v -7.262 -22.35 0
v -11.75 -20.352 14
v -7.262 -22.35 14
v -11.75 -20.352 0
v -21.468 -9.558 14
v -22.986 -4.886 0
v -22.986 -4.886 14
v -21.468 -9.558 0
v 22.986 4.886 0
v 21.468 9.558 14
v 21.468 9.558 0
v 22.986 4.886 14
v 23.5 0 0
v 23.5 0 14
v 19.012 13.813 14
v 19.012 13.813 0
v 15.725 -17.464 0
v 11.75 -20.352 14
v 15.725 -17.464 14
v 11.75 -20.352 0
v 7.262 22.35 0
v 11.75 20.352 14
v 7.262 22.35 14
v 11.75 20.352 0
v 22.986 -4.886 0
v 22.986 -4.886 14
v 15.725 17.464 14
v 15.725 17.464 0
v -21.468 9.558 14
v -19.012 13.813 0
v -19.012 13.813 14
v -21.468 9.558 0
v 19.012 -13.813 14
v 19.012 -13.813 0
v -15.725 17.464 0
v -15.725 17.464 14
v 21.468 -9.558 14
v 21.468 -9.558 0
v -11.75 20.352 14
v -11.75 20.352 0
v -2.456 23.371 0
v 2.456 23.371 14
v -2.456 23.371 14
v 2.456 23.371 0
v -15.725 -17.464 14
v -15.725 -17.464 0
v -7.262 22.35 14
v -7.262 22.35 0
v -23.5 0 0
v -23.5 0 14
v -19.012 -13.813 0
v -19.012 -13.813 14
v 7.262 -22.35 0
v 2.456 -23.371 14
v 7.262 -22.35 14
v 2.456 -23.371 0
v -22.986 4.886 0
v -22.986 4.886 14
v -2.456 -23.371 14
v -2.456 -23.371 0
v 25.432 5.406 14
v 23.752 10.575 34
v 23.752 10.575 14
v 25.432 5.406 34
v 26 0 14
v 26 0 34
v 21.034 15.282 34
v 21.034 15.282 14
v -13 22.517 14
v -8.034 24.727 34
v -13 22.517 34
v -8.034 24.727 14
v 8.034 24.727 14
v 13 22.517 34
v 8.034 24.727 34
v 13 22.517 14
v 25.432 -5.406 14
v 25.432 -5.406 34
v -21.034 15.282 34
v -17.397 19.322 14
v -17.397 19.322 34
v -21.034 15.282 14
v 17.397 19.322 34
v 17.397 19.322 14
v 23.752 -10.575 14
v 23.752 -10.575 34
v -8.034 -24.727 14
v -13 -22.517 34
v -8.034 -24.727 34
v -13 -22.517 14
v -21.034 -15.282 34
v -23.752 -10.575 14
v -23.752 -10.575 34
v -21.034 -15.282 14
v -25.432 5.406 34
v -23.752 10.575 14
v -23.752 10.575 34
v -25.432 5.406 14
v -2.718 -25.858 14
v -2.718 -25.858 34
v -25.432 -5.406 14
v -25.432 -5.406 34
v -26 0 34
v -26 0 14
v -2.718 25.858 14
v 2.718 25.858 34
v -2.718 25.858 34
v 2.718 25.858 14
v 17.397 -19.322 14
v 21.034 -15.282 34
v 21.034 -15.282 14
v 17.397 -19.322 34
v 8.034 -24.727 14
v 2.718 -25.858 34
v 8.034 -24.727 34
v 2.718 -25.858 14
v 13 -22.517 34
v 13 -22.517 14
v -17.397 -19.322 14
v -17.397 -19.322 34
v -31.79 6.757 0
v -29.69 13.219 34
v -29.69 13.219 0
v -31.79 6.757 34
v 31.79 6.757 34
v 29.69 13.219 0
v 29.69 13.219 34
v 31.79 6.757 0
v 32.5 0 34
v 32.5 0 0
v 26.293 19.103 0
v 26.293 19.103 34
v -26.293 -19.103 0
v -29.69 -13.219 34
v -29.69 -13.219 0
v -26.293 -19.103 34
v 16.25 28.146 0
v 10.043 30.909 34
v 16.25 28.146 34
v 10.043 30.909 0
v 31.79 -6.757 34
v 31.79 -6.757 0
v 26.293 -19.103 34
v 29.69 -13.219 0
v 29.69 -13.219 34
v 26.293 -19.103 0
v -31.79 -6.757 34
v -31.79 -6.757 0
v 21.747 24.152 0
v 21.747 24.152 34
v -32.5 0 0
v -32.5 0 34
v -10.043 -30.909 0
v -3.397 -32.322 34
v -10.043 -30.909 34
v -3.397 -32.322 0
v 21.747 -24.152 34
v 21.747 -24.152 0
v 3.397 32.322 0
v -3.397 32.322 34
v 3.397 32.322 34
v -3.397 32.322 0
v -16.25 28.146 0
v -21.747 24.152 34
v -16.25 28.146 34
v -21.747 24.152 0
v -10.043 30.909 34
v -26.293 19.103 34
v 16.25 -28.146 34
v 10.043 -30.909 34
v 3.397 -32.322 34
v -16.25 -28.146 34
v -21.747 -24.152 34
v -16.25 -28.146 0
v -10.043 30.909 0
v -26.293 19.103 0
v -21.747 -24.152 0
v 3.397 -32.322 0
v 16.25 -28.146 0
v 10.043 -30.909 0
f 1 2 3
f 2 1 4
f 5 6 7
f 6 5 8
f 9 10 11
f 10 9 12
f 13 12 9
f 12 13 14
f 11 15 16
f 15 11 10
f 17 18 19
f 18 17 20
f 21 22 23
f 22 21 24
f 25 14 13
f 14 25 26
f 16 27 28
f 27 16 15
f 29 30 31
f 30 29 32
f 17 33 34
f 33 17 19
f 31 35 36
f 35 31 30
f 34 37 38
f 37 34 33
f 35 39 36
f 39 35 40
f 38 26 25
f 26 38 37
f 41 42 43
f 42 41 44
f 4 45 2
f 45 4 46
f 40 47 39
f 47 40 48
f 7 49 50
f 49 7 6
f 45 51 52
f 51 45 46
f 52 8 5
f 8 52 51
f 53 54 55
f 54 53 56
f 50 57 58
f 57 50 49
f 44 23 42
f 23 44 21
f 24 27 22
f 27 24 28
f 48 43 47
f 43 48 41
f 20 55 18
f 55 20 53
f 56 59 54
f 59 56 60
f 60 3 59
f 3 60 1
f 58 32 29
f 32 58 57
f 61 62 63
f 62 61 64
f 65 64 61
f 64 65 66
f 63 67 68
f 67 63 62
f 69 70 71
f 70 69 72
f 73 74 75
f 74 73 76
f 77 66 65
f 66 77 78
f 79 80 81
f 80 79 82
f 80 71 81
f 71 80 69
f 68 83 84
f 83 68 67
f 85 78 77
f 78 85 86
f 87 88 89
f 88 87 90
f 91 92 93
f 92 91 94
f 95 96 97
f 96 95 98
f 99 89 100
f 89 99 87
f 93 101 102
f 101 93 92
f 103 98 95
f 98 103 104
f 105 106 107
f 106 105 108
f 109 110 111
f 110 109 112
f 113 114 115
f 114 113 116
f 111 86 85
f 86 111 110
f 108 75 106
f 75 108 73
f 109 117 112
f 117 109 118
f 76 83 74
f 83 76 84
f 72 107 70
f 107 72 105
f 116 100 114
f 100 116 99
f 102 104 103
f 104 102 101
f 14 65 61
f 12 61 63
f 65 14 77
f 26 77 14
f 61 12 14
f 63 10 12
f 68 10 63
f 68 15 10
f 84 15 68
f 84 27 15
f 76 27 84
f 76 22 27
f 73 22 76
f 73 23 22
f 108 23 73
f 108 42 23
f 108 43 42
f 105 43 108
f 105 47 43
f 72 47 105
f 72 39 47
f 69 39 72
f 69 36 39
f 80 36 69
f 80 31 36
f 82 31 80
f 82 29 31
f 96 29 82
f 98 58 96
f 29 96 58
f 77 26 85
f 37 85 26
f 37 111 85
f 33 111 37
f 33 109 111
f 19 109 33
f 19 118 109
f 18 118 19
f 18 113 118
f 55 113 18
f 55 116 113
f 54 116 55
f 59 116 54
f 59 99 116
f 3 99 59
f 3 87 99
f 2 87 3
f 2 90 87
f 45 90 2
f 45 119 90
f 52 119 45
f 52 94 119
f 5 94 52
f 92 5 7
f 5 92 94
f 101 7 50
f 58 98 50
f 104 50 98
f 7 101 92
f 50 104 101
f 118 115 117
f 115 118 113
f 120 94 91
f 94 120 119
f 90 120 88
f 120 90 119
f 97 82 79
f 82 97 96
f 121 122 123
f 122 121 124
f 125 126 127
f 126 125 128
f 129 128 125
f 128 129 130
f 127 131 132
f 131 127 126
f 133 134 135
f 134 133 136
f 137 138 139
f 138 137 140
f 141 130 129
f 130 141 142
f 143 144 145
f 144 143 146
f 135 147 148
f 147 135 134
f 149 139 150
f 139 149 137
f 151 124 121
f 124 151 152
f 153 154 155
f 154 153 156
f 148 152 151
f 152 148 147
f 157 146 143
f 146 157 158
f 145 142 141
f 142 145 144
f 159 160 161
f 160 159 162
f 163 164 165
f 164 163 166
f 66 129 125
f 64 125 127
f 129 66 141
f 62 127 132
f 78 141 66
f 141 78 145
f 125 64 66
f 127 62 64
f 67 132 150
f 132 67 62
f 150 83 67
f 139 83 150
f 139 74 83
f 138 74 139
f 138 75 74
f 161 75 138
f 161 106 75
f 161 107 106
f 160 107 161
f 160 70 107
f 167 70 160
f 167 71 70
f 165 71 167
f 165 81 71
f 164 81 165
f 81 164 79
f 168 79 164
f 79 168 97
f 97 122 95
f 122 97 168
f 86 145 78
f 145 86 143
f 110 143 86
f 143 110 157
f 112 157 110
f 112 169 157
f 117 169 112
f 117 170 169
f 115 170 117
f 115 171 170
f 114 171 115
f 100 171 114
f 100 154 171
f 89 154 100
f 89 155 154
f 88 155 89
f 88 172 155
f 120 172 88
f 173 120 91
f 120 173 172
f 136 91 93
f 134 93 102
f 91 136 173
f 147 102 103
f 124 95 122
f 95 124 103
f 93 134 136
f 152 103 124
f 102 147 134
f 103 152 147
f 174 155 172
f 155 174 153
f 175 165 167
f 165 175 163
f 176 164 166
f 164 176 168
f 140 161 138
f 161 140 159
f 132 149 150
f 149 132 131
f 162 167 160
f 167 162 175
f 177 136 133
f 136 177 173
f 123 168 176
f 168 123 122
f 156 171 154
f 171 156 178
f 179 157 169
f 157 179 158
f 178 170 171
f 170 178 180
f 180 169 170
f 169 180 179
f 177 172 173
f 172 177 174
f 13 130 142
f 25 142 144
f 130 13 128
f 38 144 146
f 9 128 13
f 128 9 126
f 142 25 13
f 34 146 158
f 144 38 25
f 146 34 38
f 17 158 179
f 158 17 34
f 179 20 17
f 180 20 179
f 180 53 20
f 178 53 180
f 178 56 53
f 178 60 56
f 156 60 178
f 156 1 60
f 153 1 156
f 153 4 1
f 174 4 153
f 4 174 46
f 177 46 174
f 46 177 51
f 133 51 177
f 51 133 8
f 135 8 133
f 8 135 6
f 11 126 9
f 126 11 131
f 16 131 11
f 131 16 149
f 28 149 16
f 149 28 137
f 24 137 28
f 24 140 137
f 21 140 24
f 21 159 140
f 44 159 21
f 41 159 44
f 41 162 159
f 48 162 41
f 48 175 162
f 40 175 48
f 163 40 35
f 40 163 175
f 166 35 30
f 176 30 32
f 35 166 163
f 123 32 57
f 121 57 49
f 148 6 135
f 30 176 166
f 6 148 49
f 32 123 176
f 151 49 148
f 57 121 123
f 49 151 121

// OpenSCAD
// file: parameters/verticalShaftHolderParameters.scad
// https://paper.dropbox.com/doc/Shaft-Holder-with-Bearings--BPUd0R93dqpLMge3XfPWzi2zAg-a79LjXcU3vrNJJHZMteSG

rollerBearingInsideDiameter = 45; // Same as Thrust Bearing bore diameter
rollerBearingHeight = 20;
rollerBearingOutsideDiameter = 52;

thrustBearingOutsideDiameter = 65;
thrustBearingHeight = 14;
thrustBearingOuterDiameterShaftWasher = 47;

thrustBearingMinimumAbutmentDiameter = 57; // This is a MINIMUM

comfortablePinningDiameter = 55; // Could maybe be bigger?
comfortablePinnedSectionHeight = 20; // May need testing
// file: parameters/commonParameters.scad
// All measurements in millimeters

// "horizontal" and "vertical" refer to how they are printed on the print bed,
// not how they work on the final assembly.
// ALWAYS print verticle pipes straight up if possible, that is 90 degrees from the bed.
// Attempting to print a slanted pipe will be troublesome and require testing for a proper size.
// However, you can print ANY angle ON the bed.

// 1.25" PVC Pipe:
horizontalPipeInsideDiameter_1_25pvc = 42.9;
verticalPipeInsideDiameter_1_25pvc = 42.5;

// 0.5" PVC Pipe:
horizontalPipeInsideDiameter_0_50pvc = 22.1;
verticalPipeInsideDiameter_0_50pvc = 21.7;

// Parameters
jointLegLength = 50;
jointWallThickness = 3.5;
jointPinningHoleDiameter = 7;
jointPinHoleOffset = 10;

// Walker Foot Parameters
inchesToMmConversionFactor = 25.4;

// Current idea is 11 x 21 inches.
walkerFootHeight = 11 * inchesToMmConversionFactor;
walkerFootLength = 21 * inchesToMmConversionFactor;
// Back of Foot is 4 inches longer to cause foot to hang AND LOOK as desired
// I tried 1 inch and it had basically NO affect on how it hangs.
// I think it looks cool at 4 inches, so I am going to test that.
// I *THINK* that it actually doesn't affect lenght of the walker, because the front
// of one compensates for the back of the other.
walkerFootCenterOffset = 4 * inchesToMmConversionFactor; // Remember to multiply any offset by the conversion factor.
walkerFootFrontLength = (walkerFootLength / 2) - (walkerFootCenterOffset / 2);
walkerFootBackLength = (walkerFootLength / 2) + (walkerFootCenterOffset / 2);

footLowerJointLegLength = 75;

// Angles
// This site is great for visualizing what you want: https://www.blocklayer.com/trig/scaleneeng.aspx
// Use this site to check your math and results: https://www.calculator.net/right-triangle-calculator.html
echo("=======================================================");
echo("Walker Foot Parameters");
echo("walkerFootLength", walkerFootLength, walkerFootFrontLength + walkerFootBackLength);
echo("=======================================================");
echo("Front:");
echo("walkerFootHeight (a)", walkerFootHeight);
echo("walkerFootFrontLength (b)", walkerFootFrontLength);
walkerFootFrontTriangleTopLength = sqrt(pow(walkerFootHeight, 2) + pow(walkerFootFrontLength, 2));
echo("walkerFootFrontTriangleTopLength (c)", walkerFootFrontTriangleTopLength);
walkerFootFrontJointAngle = asin(walkerFootHeight / walkerFootFrontTriangleTopLength);
echo("walkerFootFrontJointAngle (α):", walkerFootFrontJointAngle);
walkerAnkleFrontAngle = asin(walkerFootFrontLength / walkerFootFrontTriangleTopLength);
echo("walkerAnkleFrontAngle (β)", walkerAnkleFrontAngle);
echo("-------------------------------------------------------");
echo("Back");
echo("walkerFootBackLength (b)", walkerFootBackLength);
walkerFootBackTriangleTopLength = sqrt(pow(walkerFootHeight, 2) + pow(walkerFootBackLength, 2));
echo("walkerFootBackTriangleTopLength (c)", walkerFootBackTriangleTopLength);
walkerFootBackJointAngle = asin(walkerFootHeight / walkerFootBackTriangleTopLength);
echo("walkerFootBackJointAngle (α):", walkerFootBackJointAngle);
walkerAnkleBackAngle = asin(walkerFootBackLength / walkerFootBackTriangleTopLength);
echo("walkerAnkleBackAngle (β)", walkerAnkleBackAngle);
echo("=======================================================");

walkerBodyLowerShaftHolderRollerBearingHeightAboveThrustBearing = 50;

// Colors
JointColor = "CornflowerBlue";
PipeColor = "Pink";

// Resoution
// This is perfect for 3D Printing,
// but you may want to comment it out while working to improve preview
// performance
//$fa = 1;
//$fs = 0.4;
// Although this makes it VERY high rez, which might be better for the slicer? Experimenting with it instead.
// NOTE that using $fn causes FreeCAD and hence .step files exported to Fusion 360 to show round items as a series of faces instead of a single object.
//$fn = 500;
// main file
include <parameters/commonParameters.scad>;
include <parameters/verticalShaftHolderParameters.scad>;
// Example part to sit on the verticalShaftHolder
// including holding a roller bearing

// The bottom should be no narrower than thrustBearingMinimumAbutmentDiameter,
// But it can be much bigger.

// The idea is that sits ON the thrust bearing, and holds a roller bearing to minimize friction around the center shaft,
// for times when there is angular stress on the system.

module verticalShaftHolderPivotPoint(outsideDiameter = thrustBearingMinimumAbutmentDiameter, rollerBearingHeightAboveThrustBearing = thrustBearingHeight) {
    difference() {
        // Height and width of this part are minimums.
        echo(rollerBearingHeightAboveThrustBearing + rollerBearingHeight);
        cylinder(h = rollerBearingHeightAboveThrustBearing + rollerBearingHeight, d =
        outsideDiameter);
        union() {
            translate([0, 0, - 1]) // -1 just ensures we clear the bottom and don't leave a 2d "film"
                cylinder(h = 200, d = thrustBearingOuterDiameterShaftWasher);
            translate([0, 0, rollerBearingHeightAboveThrustBearing])
                cylinder(h = 200, d = rollerBearingOutsideDiameter);
        }
    }
}

// Remember that the thrust bearing fits between these two parts,
// In theory one could "encapsulate" it, but remember the top and bottom
// of the thrust washer have the same outside diameter, so you can't "squeeze" it.
// In theory the INSIDE of this part should hold everything in place.

// The only possible "slop" is that the roller ball carrier and the top of the thrust bearing could "rattle" a little, but I think that the groove in the top and bottom pieces
// will center it rapidly.
// Not to mention pinning it relatively tighly will prevent it "poppping out".

// If that is an issue though, we could "capture" or "squeeze" the top "washer"
// of the thrust bearing.

// The MINIMUM outside diameter is thrustBearingMinimumAbutmentDiameter,
// which is the default if no argument is given,
// But to fully use the entire surface of the thrust washer use thrustBearingOutsideDiameter
verticalShaftHolderPivotPoint(outsideDiameter = thrustBearingOutsideDiameter);
